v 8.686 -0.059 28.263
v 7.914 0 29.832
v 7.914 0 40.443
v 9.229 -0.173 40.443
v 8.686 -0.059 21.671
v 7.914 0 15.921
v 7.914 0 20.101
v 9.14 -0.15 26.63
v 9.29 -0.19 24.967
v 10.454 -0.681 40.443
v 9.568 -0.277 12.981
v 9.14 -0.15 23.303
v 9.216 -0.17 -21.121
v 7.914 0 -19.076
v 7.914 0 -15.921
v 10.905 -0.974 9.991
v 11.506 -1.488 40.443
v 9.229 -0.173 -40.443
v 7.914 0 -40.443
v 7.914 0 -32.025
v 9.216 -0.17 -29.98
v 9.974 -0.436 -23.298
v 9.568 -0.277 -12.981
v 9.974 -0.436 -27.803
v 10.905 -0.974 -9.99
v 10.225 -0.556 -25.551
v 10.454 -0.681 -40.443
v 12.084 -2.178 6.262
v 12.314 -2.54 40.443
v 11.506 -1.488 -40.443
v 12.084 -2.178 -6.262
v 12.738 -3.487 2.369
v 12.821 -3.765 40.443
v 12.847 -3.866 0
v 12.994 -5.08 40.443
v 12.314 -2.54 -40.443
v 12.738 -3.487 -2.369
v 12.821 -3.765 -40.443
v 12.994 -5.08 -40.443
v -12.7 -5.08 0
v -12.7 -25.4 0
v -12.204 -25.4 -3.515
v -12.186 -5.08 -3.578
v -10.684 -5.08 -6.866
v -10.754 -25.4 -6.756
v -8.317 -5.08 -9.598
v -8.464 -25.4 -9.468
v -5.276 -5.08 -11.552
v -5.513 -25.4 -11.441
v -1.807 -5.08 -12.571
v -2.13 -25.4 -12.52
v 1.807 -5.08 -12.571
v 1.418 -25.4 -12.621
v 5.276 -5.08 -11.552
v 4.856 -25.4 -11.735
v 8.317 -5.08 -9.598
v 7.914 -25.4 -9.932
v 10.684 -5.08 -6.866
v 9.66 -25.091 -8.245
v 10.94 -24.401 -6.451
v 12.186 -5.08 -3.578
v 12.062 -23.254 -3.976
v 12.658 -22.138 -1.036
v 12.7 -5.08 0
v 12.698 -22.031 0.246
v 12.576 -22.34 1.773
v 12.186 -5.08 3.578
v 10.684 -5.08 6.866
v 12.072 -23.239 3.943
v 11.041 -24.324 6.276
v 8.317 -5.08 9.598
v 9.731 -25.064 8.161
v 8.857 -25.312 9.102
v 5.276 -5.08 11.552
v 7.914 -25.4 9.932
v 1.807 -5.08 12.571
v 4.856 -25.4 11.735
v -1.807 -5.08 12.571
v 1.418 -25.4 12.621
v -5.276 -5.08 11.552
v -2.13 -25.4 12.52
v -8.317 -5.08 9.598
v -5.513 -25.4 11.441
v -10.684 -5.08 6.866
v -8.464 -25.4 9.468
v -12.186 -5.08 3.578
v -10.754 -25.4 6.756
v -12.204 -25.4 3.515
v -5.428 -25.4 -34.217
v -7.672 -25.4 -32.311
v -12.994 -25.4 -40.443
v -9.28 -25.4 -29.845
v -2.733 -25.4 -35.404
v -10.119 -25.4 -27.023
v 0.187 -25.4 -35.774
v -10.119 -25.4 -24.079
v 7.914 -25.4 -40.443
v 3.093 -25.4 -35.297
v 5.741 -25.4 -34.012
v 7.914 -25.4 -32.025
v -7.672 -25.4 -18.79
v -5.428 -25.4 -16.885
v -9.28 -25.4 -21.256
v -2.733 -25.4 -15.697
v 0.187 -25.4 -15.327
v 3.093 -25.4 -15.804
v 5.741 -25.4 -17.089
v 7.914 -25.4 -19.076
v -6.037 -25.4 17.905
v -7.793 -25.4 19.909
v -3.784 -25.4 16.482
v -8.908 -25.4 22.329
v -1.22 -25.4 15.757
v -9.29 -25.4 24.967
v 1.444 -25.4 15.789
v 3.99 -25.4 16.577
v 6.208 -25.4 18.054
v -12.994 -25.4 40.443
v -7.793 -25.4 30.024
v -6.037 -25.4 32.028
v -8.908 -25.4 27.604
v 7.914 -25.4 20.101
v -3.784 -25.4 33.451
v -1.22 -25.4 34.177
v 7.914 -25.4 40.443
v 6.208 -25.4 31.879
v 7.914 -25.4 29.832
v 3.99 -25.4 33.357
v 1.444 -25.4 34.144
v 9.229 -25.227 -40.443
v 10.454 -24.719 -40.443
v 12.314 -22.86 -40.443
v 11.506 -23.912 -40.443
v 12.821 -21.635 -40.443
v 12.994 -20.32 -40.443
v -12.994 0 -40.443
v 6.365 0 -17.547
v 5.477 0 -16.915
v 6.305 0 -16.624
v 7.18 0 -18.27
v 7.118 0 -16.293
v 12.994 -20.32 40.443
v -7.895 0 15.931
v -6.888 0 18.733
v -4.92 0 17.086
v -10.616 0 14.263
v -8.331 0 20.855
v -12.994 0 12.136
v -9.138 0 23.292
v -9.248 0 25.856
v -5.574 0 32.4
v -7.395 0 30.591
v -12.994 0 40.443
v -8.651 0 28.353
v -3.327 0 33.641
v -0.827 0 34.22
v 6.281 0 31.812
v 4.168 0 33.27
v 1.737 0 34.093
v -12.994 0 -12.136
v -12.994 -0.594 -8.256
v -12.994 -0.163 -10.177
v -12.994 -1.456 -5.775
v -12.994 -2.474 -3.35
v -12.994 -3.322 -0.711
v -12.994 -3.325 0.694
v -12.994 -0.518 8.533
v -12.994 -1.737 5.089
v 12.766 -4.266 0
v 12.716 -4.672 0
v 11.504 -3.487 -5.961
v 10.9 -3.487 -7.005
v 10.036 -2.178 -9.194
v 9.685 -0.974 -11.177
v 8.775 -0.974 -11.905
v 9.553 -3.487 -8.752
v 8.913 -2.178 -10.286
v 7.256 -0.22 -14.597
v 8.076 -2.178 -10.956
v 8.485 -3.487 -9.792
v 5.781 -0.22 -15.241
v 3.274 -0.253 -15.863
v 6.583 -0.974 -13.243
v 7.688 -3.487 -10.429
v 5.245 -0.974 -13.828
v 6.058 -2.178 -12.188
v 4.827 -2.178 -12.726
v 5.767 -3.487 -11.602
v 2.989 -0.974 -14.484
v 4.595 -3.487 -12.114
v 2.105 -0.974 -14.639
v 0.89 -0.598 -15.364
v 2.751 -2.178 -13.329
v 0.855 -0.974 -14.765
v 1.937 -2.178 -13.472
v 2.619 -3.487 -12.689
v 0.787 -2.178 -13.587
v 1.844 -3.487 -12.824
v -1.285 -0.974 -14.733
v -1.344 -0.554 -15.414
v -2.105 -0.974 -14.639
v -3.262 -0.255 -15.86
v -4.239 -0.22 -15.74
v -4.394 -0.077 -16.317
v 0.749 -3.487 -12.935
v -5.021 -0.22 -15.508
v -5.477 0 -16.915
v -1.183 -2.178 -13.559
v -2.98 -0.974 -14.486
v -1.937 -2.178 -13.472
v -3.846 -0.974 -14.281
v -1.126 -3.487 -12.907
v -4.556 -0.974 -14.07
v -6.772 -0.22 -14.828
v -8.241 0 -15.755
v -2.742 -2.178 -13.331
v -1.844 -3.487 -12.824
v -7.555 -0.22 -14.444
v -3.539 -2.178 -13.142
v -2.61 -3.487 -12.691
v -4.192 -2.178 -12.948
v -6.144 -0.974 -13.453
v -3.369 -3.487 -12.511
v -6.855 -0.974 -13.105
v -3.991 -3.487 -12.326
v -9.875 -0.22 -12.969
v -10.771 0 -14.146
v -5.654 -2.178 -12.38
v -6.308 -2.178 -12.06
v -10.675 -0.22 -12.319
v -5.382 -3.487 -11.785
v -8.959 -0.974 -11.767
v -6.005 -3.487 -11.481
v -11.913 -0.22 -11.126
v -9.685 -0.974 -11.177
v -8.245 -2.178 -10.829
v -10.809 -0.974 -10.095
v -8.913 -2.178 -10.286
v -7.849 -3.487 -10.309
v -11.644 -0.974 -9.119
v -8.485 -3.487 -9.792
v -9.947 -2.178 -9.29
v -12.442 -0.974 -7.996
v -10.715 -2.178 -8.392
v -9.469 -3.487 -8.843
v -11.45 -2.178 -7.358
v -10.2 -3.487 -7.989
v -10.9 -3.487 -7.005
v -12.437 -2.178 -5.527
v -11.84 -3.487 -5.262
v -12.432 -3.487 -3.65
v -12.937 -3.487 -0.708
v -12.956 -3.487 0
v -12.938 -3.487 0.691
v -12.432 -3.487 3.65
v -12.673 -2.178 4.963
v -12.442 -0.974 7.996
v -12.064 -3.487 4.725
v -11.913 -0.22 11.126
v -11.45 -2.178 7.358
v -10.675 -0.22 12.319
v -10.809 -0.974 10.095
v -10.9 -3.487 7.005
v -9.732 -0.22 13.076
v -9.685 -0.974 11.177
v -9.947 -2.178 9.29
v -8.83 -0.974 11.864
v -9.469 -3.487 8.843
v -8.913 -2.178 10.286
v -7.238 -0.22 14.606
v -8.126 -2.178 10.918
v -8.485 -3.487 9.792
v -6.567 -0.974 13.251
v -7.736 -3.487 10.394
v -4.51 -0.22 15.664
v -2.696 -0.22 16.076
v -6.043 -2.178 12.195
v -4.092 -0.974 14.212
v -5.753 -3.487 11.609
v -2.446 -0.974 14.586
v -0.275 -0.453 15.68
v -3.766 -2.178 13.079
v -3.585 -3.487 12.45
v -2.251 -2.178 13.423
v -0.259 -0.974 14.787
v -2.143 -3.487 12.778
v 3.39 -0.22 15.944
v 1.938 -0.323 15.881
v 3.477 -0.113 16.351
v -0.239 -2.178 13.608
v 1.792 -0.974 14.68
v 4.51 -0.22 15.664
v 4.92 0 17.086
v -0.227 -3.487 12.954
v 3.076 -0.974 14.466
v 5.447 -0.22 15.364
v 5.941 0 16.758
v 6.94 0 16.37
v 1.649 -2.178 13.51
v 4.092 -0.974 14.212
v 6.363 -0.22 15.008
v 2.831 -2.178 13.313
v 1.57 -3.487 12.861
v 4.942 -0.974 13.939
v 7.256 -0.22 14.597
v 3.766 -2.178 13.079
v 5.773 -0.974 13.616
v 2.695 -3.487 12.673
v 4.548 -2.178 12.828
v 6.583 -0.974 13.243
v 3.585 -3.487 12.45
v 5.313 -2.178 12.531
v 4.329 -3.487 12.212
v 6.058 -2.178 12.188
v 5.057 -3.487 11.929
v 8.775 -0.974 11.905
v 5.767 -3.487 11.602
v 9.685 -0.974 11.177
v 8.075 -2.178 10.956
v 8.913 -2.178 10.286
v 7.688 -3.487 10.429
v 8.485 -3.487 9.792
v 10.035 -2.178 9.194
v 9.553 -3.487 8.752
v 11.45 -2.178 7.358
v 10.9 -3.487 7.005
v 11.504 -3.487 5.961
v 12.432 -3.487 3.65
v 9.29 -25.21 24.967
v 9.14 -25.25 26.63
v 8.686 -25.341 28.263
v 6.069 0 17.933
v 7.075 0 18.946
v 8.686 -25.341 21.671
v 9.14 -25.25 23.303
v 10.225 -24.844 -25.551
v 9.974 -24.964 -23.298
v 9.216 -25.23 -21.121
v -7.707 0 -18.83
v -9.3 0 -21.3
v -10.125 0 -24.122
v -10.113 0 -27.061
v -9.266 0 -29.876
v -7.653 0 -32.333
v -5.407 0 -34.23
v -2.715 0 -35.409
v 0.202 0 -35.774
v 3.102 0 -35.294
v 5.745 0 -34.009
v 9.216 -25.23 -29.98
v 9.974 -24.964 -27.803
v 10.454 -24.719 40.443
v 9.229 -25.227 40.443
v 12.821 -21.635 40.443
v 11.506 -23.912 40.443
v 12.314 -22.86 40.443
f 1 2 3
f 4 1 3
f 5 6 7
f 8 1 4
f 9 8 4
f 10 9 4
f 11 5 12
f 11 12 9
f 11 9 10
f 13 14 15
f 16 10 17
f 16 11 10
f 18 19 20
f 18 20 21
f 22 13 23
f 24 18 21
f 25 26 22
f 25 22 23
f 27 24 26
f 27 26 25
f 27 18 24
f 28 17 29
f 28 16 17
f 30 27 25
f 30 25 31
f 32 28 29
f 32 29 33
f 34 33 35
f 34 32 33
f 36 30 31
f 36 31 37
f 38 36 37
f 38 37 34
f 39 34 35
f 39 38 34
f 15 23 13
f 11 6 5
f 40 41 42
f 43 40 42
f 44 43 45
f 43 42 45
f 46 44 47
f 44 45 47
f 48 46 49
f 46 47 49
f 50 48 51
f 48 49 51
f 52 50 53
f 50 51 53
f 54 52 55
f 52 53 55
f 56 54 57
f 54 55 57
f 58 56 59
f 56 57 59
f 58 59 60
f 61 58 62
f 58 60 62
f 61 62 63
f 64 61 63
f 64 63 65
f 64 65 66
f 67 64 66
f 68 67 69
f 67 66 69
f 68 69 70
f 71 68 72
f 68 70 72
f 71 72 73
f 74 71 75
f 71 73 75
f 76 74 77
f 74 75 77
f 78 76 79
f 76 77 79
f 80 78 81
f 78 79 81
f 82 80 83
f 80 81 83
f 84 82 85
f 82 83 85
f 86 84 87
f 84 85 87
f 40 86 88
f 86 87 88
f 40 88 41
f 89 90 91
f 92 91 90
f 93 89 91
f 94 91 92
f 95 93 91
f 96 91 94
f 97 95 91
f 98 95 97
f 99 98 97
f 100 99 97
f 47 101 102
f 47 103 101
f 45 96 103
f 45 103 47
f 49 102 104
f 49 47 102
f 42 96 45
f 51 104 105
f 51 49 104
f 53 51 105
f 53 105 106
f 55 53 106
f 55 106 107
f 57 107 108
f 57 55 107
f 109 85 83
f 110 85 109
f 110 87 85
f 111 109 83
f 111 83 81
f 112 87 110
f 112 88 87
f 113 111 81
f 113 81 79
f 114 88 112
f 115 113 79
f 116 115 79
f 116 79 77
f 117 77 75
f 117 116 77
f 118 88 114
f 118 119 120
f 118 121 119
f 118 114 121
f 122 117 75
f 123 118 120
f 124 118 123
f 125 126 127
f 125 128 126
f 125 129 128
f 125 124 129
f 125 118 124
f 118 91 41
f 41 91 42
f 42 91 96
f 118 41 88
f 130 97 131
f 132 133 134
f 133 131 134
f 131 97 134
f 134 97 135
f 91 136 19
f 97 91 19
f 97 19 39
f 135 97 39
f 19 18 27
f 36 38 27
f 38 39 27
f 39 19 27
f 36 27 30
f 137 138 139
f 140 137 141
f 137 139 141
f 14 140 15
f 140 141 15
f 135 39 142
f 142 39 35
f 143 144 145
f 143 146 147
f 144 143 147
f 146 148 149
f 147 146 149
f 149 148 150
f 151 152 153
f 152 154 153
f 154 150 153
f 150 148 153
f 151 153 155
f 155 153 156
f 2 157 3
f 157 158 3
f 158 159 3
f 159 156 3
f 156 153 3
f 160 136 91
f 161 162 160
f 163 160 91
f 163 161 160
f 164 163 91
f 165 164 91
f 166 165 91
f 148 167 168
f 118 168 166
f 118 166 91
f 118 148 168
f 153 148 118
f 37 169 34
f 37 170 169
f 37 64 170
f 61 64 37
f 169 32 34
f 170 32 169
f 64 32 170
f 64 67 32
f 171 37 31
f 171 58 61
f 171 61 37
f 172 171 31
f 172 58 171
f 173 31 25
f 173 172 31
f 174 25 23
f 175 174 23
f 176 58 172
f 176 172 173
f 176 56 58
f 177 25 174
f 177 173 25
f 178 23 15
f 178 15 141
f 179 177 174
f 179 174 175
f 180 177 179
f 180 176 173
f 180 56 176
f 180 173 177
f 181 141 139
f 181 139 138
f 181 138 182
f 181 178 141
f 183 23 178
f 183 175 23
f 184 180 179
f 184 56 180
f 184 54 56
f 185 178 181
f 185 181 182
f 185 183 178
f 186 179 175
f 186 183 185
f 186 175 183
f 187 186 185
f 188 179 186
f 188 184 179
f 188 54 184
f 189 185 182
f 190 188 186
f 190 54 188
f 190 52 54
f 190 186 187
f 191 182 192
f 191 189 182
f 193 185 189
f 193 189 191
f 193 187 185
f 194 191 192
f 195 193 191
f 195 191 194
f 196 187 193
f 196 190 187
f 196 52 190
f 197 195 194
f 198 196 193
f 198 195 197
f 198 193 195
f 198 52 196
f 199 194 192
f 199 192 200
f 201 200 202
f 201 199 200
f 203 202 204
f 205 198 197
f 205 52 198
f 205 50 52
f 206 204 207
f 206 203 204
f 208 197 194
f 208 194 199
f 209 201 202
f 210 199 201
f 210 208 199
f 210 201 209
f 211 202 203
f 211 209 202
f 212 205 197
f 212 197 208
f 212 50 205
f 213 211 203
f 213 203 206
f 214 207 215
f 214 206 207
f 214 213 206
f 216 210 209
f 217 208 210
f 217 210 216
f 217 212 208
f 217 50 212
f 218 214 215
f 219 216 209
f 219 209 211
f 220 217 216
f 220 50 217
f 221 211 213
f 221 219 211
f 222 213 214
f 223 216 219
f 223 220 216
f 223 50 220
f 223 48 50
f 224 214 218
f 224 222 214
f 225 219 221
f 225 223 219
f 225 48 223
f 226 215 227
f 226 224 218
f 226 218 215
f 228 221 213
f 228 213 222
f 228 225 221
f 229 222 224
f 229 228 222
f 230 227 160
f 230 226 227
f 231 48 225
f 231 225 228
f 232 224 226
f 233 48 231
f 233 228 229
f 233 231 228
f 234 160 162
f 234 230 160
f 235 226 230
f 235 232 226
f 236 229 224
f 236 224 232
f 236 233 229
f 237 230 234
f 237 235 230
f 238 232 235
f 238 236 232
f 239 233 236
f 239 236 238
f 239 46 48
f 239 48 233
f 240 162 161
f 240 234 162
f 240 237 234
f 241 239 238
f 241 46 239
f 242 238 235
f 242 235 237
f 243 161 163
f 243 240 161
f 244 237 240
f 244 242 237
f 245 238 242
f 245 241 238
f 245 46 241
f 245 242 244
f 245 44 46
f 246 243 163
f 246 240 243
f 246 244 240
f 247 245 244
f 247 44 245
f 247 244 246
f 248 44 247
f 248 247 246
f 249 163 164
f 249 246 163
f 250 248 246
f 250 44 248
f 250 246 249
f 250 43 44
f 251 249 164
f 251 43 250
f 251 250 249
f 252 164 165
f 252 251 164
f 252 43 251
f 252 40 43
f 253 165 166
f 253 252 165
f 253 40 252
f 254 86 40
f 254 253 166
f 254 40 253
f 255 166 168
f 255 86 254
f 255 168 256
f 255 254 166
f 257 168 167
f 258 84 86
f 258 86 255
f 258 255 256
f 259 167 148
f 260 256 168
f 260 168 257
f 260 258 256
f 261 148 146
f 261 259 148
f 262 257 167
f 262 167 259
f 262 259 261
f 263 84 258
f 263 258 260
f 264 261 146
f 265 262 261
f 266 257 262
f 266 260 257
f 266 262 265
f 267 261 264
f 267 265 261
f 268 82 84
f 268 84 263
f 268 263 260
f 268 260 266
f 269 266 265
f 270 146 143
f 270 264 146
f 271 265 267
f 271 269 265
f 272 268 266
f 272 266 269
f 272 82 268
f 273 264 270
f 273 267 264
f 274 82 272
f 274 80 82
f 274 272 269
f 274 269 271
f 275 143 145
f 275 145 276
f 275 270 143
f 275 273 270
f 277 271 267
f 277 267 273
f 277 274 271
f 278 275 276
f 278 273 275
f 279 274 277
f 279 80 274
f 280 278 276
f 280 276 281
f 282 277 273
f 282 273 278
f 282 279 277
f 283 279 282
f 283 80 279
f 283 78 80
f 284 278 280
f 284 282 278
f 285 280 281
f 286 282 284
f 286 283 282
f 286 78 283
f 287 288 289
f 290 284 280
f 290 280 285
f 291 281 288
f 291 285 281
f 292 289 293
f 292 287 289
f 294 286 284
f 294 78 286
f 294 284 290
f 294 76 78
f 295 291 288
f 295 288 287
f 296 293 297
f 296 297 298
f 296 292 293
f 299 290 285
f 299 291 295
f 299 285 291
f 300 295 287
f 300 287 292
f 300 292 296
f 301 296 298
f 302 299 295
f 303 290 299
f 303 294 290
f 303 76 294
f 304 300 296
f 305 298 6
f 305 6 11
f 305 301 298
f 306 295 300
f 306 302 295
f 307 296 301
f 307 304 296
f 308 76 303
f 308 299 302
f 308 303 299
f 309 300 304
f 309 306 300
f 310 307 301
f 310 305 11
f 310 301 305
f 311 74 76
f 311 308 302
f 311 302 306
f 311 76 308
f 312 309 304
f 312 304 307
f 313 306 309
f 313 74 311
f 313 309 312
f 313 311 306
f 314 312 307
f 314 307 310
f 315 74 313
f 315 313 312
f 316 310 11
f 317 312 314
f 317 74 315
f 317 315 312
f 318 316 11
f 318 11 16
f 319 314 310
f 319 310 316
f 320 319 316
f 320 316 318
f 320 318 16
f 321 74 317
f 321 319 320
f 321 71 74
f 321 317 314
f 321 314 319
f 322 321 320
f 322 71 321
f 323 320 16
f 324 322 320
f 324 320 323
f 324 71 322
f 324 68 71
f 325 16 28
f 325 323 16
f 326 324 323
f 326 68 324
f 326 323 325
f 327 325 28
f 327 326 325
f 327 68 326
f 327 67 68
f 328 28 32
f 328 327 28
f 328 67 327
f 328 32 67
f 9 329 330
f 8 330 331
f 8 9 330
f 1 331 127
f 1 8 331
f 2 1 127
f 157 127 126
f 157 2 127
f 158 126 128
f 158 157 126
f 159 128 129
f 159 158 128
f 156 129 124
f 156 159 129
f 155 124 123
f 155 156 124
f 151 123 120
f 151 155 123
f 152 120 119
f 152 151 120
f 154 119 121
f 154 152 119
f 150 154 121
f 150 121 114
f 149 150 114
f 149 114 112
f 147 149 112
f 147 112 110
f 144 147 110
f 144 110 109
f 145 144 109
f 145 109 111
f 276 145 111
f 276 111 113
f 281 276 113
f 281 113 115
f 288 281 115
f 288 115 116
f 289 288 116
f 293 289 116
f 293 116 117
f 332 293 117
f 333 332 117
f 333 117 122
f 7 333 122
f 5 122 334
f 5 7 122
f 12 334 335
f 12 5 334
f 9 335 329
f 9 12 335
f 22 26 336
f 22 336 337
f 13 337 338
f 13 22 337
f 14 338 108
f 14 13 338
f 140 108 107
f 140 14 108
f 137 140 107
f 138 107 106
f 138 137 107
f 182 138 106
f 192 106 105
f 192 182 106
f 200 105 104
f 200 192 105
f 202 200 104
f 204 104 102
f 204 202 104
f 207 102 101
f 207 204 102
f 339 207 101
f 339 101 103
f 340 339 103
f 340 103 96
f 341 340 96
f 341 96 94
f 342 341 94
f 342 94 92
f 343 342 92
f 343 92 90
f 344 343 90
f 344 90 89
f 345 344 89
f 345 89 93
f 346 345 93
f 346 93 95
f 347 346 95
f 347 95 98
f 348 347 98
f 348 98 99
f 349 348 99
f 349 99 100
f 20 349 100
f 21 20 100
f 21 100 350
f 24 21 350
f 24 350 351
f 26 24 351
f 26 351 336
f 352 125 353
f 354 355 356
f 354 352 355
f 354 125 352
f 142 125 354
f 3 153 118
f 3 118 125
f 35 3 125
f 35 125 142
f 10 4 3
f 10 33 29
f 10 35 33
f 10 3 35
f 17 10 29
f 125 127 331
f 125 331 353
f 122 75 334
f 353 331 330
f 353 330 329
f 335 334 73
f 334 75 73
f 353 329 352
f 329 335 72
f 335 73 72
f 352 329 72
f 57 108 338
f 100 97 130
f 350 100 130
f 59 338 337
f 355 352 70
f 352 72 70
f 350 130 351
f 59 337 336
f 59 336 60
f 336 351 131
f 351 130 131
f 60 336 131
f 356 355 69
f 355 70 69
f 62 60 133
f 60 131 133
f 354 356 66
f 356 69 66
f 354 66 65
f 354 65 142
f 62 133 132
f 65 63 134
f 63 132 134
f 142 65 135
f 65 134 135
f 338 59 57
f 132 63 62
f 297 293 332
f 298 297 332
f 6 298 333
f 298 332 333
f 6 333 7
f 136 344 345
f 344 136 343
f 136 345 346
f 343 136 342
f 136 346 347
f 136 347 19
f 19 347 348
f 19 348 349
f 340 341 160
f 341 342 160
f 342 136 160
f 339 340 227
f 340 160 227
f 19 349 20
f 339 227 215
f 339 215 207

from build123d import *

# Parameters (mm, degrees)
F2_W        = 25.9886477143
F2_H        = 80.8860212564
F2_R        = 10.2254684018
F2_R_2      = 9.290469056
F3_DEPTH    = 25.4
F4_D        = 25.4
F5_T1_DEPTH = 106.2860212564


# Not quite as in the source:
# - a fillet or chamfer that OpenCascade refuses, or shapes differently, is made with other operations: its cross-section is extruded or revolved along the edge and cut away or added
# - a feature names something its author has since deleted; it is built from what else it names


with BuildPart() as f3:
    # F2 (on face) → F3 (new body)
    with BuildSketch(Plane.XZ):
        Rectangle(F2_W, F2_H)
        with Locations((0, -25.5506392568)):
            Circle(F2_R, mode=Mode.SUBTRACT)
        with Locations((0, 24.9666236341)):
            Circle(F2_R_2, mode=Mode.SUBTRACT)
    extrude(amount=F3_DEPTH)

    # F4 (through all)
    with Locations(Plane(origin=(0, 0, 0), x_dir=(1, 0, 0), z_dir=(0, 1, 0))):
        with Locations((0, 0)):
            Hole(F4_D / 2)

    # F5: fillet of radius 5.08 on 3 edges, made by hand

    # F5_s2 → F5_t1 (cut)
    with BuildSketch(Plane.XY.offset(-53.1430106282)):
        with BuildLine():
            ThreePointArc((7.9143238571, 0), (11.5064263056, -1.4878975516), (12.9943238571, -5.08))
            Line((12.9943238571, -5.08), (12.9943238571, 0))
            Line((12.9943238571, 0), (7.9143238571, 0))
        make_face()
        with BuildLine():
            ThreePointArc((7.9143238571, -25.4), (11.5064263056, -23.9121024484), (12.9943238571, -20.32))
            Line((12.9943238571, -20.32), (12.9943238571, -25.4))
            Line((12.9943238571, -25.4), (7.9143238571, -25.4))
        make_face()
    extrude(amount=F5_T1_DEPTH, mode=Mode.SUBTRACT)

    # F5_s3 → F5_t4 (revolve, cut)
    with BuildSketch(Plane.XY):
        with BuildLine():
            ThreePointArc((17.78, 0), (14.1878975516, -1.4878975516), (12.7, -5.08))
            Line((12.7, -5.08), (12.7, 0))
            Line((12.7, 0), (17.78, 0))
        make_face()
    revolve(axis=Axis((0, 0, 0), (0, 1, 0)), mode=Mode.SUBTRACT)


solid = f3.part
